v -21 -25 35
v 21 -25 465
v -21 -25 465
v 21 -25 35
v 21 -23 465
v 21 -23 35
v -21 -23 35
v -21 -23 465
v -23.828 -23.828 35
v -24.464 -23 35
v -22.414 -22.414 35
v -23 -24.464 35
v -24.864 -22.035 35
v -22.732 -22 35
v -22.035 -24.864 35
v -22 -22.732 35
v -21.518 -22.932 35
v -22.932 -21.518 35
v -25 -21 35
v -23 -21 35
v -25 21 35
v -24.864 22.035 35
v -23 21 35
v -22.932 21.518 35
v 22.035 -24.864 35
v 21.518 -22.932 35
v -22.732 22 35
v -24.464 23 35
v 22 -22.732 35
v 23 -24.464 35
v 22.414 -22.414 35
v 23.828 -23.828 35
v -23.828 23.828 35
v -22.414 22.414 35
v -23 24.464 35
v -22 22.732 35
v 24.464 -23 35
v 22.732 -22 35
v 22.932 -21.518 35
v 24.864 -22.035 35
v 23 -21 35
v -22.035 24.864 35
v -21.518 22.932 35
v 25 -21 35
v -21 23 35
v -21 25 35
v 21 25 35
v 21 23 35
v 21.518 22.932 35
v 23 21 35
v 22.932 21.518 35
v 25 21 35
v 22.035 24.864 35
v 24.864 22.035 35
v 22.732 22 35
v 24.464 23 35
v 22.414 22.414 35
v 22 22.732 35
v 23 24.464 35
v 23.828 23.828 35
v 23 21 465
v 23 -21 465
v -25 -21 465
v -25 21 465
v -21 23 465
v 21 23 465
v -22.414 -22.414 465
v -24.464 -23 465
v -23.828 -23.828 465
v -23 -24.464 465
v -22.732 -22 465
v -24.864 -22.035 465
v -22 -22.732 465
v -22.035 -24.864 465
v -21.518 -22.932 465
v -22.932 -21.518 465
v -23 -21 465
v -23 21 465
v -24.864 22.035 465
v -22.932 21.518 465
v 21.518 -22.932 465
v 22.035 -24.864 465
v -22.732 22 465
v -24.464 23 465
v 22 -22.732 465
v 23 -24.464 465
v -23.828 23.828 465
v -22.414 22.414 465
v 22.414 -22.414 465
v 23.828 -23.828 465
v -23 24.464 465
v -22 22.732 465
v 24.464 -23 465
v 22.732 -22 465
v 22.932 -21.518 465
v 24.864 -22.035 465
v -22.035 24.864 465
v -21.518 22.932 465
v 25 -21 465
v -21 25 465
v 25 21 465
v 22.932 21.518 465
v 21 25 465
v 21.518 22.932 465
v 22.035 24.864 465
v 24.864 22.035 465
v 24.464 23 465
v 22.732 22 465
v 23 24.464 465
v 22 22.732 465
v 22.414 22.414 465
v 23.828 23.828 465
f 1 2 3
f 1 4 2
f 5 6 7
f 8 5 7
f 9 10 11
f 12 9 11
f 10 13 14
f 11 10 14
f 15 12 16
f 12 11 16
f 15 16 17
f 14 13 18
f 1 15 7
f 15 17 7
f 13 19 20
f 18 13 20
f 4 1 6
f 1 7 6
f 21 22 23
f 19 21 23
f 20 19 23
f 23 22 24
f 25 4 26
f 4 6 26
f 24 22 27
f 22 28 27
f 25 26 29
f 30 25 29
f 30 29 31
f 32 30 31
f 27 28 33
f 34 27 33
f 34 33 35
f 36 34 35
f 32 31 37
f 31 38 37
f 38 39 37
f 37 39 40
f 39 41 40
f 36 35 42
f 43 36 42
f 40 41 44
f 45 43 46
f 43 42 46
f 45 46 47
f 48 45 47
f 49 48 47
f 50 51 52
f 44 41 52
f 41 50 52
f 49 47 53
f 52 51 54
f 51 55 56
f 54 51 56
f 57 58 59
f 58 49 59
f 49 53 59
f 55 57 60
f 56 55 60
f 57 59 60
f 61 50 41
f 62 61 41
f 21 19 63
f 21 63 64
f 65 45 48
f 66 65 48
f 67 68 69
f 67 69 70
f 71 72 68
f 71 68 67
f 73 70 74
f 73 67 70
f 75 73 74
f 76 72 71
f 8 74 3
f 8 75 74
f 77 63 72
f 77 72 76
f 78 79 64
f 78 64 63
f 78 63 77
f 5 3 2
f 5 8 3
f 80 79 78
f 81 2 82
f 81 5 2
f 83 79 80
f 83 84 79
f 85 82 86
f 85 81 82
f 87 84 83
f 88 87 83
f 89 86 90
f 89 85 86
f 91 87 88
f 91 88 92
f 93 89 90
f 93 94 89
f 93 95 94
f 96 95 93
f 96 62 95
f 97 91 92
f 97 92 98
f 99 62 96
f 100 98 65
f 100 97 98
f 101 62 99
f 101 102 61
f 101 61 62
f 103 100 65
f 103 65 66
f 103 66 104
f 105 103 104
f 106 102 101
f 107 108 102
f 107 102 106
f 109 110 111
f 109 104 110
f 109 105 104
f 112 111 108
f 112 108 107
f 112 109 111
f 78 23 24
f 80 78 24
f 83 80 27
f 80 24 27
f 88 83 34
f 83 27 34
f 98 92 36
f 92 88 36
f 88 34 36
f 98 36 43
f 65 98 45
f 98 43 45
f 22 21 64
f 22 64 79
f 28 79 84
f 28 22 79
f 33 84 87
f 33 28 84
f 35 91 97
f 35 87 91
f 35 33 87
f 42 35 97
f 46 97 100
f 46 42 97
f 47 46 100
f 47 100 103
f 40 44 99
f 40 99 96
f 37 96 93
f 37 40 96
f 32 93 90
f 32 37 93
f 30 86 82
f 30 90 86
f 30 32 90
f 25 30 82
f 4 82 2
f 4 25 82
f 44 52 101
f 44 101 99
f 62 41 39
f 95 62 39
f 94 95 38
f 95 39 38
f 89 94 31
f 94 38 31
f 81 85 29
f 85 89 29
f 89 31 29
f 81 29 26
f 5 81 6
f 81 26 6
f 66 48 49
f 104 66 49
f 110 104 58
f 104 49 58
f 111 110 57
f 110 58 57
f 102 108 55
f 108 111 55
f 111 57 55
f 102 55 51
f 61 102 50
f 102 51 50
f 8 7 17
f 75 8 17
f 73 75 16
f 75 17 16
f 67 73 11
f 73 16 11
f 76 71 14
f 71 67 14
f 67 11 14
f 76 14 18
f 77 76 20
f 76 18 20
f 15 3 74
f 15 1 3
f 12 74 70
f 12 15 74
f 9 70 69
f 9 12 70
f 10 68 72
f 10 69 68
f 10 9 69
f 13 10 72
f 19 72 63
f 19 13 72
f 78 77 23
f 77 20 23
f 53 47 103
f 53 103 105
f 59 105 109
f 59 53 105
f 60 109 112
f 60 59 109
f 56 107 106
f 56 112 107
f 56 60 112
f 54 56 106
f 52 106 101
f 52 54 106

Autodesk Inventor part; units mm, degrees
ref_plane "Plano inicial" through (0, 0, 35) normal (0, 0, 1) x (1, 0, 0)
ref_plane "Plano final" through (0, 0, 465) normal (0, 0, 1) x (1, 0, 0)
sketch "Boceto" plane through (0, 0, 0) normal (0, 0, 1) x (1, 0, 0)
  line L0 (-25, -21) -> (-25, 21)
  line L1 (-21, 25) -> (21, 25)
  line L2 (25, 21) -> (25, -21)
  line L3 (21, -25) -> (-21, -25)
  arc A0 (-25, -21) -> (-21, -25) centre (-21, -21) ccw
  arc A1 (25, 21) -> (21, 25) centre (21, 21) ccw
  arc A2 (-21, 25) -> (-25, 21) centre (-21, 21) ccw
  arc A3 (21, -25) -> (25, -21) centre (21, -21) ccw
  arc A4 (-21, 23) -> (-23, 21) centre (-21, 21) ccw
  line L4 (-21, 23) -> (21, 23)
  arc A5 (23, 21) -> (21, 23) centre (21, 21) ccw
  line L5 (23, 21) -> (23, -21)
  arc A6 (21, -23) -> (23, -21) centre (21, -21) ccw
  line L6 (21, -23) -> (-21, -23)
  arc A7 (-23, -21) -> (-21, -23) centre (-21, -21) ccw
  line L7 (-23, -21) -> (-23, 21)
  line L8 (0, 36.1598) -> (0, -36.1598) construction
  line L9 (-36.1598, 0) -> (36.1598, 0) construction
  dimension "d7" = 4
  dimension "d9" = 50
  dimension "d11" = 50
  dimension "d12" = 2
  dimension "d15" = 25
  dimension "d16" = 25
extrude "Cuerpo" add sketch "Boceto" along normal up to surface (430 mm away) from surface at 35
sketch "Sketch3" plane through (0, 0, 0) normal (0, 0, 1) x (1, 0, 0)
  line L0 (0, 0) -> (10, 0)
ref_plane "Work Plane3" through (0, 0, 0) normal (0, -1, 0) x (1, 0, 0)
sketch "Sketch4" plane through (0, 0, 0) normal (0, -1, 0) x (1, 0, 0)
  line L0 (-2, 35) -> (12, 35)
  line L1 (-2, 465) -> (12, 465)
  dimension "d18" = 430
ref_plane "Plano de trabajo4" through (-640, 29, 465) normal (0, 0, 1) x (1, 0, 0)
split "Dividir1" plane through (-640, 29, 465) removes the side toward (0, 0, 1)
ref_plane "Plano de trabajo5" through (-640, -29, 35) normal (0, 0, -1) x (-1, 0, 0)
split "Dividir2" plane through (-640, -29, 35) removes the side toward (0, 0, -1)
equation "\"d7\" = G_IR"
equation "\"d9\" = G_W"
equation "\"d11\" = G_H"
equation "\"d12\" = G_T"
equation "\"d15\" = 0.5 * d9"
equation "\"d16\" = 0.5 * d11"
equation "\"d3\" = G_L"
equation "\"G_W\" = 50"
equation "\"G_H\" = 50"
equation "\"G_T\" = 2"
equation "\"G_IR\" = 4"
equation "\"G_L\" = d18"
equation "\"G_OFFSET_START\" = -35"
equation "\"G_OFFSET_END\" = -35"
equation "\"d13\" = -G_OFFSET_START"
equation "\"d14\" = G_OFFSET_END + B_L"
equation "\"B_L\" = 500"
properties part number "ISO 10799-2 - 50x50x2 - 430" material "Galvanizado catalogo 1"
